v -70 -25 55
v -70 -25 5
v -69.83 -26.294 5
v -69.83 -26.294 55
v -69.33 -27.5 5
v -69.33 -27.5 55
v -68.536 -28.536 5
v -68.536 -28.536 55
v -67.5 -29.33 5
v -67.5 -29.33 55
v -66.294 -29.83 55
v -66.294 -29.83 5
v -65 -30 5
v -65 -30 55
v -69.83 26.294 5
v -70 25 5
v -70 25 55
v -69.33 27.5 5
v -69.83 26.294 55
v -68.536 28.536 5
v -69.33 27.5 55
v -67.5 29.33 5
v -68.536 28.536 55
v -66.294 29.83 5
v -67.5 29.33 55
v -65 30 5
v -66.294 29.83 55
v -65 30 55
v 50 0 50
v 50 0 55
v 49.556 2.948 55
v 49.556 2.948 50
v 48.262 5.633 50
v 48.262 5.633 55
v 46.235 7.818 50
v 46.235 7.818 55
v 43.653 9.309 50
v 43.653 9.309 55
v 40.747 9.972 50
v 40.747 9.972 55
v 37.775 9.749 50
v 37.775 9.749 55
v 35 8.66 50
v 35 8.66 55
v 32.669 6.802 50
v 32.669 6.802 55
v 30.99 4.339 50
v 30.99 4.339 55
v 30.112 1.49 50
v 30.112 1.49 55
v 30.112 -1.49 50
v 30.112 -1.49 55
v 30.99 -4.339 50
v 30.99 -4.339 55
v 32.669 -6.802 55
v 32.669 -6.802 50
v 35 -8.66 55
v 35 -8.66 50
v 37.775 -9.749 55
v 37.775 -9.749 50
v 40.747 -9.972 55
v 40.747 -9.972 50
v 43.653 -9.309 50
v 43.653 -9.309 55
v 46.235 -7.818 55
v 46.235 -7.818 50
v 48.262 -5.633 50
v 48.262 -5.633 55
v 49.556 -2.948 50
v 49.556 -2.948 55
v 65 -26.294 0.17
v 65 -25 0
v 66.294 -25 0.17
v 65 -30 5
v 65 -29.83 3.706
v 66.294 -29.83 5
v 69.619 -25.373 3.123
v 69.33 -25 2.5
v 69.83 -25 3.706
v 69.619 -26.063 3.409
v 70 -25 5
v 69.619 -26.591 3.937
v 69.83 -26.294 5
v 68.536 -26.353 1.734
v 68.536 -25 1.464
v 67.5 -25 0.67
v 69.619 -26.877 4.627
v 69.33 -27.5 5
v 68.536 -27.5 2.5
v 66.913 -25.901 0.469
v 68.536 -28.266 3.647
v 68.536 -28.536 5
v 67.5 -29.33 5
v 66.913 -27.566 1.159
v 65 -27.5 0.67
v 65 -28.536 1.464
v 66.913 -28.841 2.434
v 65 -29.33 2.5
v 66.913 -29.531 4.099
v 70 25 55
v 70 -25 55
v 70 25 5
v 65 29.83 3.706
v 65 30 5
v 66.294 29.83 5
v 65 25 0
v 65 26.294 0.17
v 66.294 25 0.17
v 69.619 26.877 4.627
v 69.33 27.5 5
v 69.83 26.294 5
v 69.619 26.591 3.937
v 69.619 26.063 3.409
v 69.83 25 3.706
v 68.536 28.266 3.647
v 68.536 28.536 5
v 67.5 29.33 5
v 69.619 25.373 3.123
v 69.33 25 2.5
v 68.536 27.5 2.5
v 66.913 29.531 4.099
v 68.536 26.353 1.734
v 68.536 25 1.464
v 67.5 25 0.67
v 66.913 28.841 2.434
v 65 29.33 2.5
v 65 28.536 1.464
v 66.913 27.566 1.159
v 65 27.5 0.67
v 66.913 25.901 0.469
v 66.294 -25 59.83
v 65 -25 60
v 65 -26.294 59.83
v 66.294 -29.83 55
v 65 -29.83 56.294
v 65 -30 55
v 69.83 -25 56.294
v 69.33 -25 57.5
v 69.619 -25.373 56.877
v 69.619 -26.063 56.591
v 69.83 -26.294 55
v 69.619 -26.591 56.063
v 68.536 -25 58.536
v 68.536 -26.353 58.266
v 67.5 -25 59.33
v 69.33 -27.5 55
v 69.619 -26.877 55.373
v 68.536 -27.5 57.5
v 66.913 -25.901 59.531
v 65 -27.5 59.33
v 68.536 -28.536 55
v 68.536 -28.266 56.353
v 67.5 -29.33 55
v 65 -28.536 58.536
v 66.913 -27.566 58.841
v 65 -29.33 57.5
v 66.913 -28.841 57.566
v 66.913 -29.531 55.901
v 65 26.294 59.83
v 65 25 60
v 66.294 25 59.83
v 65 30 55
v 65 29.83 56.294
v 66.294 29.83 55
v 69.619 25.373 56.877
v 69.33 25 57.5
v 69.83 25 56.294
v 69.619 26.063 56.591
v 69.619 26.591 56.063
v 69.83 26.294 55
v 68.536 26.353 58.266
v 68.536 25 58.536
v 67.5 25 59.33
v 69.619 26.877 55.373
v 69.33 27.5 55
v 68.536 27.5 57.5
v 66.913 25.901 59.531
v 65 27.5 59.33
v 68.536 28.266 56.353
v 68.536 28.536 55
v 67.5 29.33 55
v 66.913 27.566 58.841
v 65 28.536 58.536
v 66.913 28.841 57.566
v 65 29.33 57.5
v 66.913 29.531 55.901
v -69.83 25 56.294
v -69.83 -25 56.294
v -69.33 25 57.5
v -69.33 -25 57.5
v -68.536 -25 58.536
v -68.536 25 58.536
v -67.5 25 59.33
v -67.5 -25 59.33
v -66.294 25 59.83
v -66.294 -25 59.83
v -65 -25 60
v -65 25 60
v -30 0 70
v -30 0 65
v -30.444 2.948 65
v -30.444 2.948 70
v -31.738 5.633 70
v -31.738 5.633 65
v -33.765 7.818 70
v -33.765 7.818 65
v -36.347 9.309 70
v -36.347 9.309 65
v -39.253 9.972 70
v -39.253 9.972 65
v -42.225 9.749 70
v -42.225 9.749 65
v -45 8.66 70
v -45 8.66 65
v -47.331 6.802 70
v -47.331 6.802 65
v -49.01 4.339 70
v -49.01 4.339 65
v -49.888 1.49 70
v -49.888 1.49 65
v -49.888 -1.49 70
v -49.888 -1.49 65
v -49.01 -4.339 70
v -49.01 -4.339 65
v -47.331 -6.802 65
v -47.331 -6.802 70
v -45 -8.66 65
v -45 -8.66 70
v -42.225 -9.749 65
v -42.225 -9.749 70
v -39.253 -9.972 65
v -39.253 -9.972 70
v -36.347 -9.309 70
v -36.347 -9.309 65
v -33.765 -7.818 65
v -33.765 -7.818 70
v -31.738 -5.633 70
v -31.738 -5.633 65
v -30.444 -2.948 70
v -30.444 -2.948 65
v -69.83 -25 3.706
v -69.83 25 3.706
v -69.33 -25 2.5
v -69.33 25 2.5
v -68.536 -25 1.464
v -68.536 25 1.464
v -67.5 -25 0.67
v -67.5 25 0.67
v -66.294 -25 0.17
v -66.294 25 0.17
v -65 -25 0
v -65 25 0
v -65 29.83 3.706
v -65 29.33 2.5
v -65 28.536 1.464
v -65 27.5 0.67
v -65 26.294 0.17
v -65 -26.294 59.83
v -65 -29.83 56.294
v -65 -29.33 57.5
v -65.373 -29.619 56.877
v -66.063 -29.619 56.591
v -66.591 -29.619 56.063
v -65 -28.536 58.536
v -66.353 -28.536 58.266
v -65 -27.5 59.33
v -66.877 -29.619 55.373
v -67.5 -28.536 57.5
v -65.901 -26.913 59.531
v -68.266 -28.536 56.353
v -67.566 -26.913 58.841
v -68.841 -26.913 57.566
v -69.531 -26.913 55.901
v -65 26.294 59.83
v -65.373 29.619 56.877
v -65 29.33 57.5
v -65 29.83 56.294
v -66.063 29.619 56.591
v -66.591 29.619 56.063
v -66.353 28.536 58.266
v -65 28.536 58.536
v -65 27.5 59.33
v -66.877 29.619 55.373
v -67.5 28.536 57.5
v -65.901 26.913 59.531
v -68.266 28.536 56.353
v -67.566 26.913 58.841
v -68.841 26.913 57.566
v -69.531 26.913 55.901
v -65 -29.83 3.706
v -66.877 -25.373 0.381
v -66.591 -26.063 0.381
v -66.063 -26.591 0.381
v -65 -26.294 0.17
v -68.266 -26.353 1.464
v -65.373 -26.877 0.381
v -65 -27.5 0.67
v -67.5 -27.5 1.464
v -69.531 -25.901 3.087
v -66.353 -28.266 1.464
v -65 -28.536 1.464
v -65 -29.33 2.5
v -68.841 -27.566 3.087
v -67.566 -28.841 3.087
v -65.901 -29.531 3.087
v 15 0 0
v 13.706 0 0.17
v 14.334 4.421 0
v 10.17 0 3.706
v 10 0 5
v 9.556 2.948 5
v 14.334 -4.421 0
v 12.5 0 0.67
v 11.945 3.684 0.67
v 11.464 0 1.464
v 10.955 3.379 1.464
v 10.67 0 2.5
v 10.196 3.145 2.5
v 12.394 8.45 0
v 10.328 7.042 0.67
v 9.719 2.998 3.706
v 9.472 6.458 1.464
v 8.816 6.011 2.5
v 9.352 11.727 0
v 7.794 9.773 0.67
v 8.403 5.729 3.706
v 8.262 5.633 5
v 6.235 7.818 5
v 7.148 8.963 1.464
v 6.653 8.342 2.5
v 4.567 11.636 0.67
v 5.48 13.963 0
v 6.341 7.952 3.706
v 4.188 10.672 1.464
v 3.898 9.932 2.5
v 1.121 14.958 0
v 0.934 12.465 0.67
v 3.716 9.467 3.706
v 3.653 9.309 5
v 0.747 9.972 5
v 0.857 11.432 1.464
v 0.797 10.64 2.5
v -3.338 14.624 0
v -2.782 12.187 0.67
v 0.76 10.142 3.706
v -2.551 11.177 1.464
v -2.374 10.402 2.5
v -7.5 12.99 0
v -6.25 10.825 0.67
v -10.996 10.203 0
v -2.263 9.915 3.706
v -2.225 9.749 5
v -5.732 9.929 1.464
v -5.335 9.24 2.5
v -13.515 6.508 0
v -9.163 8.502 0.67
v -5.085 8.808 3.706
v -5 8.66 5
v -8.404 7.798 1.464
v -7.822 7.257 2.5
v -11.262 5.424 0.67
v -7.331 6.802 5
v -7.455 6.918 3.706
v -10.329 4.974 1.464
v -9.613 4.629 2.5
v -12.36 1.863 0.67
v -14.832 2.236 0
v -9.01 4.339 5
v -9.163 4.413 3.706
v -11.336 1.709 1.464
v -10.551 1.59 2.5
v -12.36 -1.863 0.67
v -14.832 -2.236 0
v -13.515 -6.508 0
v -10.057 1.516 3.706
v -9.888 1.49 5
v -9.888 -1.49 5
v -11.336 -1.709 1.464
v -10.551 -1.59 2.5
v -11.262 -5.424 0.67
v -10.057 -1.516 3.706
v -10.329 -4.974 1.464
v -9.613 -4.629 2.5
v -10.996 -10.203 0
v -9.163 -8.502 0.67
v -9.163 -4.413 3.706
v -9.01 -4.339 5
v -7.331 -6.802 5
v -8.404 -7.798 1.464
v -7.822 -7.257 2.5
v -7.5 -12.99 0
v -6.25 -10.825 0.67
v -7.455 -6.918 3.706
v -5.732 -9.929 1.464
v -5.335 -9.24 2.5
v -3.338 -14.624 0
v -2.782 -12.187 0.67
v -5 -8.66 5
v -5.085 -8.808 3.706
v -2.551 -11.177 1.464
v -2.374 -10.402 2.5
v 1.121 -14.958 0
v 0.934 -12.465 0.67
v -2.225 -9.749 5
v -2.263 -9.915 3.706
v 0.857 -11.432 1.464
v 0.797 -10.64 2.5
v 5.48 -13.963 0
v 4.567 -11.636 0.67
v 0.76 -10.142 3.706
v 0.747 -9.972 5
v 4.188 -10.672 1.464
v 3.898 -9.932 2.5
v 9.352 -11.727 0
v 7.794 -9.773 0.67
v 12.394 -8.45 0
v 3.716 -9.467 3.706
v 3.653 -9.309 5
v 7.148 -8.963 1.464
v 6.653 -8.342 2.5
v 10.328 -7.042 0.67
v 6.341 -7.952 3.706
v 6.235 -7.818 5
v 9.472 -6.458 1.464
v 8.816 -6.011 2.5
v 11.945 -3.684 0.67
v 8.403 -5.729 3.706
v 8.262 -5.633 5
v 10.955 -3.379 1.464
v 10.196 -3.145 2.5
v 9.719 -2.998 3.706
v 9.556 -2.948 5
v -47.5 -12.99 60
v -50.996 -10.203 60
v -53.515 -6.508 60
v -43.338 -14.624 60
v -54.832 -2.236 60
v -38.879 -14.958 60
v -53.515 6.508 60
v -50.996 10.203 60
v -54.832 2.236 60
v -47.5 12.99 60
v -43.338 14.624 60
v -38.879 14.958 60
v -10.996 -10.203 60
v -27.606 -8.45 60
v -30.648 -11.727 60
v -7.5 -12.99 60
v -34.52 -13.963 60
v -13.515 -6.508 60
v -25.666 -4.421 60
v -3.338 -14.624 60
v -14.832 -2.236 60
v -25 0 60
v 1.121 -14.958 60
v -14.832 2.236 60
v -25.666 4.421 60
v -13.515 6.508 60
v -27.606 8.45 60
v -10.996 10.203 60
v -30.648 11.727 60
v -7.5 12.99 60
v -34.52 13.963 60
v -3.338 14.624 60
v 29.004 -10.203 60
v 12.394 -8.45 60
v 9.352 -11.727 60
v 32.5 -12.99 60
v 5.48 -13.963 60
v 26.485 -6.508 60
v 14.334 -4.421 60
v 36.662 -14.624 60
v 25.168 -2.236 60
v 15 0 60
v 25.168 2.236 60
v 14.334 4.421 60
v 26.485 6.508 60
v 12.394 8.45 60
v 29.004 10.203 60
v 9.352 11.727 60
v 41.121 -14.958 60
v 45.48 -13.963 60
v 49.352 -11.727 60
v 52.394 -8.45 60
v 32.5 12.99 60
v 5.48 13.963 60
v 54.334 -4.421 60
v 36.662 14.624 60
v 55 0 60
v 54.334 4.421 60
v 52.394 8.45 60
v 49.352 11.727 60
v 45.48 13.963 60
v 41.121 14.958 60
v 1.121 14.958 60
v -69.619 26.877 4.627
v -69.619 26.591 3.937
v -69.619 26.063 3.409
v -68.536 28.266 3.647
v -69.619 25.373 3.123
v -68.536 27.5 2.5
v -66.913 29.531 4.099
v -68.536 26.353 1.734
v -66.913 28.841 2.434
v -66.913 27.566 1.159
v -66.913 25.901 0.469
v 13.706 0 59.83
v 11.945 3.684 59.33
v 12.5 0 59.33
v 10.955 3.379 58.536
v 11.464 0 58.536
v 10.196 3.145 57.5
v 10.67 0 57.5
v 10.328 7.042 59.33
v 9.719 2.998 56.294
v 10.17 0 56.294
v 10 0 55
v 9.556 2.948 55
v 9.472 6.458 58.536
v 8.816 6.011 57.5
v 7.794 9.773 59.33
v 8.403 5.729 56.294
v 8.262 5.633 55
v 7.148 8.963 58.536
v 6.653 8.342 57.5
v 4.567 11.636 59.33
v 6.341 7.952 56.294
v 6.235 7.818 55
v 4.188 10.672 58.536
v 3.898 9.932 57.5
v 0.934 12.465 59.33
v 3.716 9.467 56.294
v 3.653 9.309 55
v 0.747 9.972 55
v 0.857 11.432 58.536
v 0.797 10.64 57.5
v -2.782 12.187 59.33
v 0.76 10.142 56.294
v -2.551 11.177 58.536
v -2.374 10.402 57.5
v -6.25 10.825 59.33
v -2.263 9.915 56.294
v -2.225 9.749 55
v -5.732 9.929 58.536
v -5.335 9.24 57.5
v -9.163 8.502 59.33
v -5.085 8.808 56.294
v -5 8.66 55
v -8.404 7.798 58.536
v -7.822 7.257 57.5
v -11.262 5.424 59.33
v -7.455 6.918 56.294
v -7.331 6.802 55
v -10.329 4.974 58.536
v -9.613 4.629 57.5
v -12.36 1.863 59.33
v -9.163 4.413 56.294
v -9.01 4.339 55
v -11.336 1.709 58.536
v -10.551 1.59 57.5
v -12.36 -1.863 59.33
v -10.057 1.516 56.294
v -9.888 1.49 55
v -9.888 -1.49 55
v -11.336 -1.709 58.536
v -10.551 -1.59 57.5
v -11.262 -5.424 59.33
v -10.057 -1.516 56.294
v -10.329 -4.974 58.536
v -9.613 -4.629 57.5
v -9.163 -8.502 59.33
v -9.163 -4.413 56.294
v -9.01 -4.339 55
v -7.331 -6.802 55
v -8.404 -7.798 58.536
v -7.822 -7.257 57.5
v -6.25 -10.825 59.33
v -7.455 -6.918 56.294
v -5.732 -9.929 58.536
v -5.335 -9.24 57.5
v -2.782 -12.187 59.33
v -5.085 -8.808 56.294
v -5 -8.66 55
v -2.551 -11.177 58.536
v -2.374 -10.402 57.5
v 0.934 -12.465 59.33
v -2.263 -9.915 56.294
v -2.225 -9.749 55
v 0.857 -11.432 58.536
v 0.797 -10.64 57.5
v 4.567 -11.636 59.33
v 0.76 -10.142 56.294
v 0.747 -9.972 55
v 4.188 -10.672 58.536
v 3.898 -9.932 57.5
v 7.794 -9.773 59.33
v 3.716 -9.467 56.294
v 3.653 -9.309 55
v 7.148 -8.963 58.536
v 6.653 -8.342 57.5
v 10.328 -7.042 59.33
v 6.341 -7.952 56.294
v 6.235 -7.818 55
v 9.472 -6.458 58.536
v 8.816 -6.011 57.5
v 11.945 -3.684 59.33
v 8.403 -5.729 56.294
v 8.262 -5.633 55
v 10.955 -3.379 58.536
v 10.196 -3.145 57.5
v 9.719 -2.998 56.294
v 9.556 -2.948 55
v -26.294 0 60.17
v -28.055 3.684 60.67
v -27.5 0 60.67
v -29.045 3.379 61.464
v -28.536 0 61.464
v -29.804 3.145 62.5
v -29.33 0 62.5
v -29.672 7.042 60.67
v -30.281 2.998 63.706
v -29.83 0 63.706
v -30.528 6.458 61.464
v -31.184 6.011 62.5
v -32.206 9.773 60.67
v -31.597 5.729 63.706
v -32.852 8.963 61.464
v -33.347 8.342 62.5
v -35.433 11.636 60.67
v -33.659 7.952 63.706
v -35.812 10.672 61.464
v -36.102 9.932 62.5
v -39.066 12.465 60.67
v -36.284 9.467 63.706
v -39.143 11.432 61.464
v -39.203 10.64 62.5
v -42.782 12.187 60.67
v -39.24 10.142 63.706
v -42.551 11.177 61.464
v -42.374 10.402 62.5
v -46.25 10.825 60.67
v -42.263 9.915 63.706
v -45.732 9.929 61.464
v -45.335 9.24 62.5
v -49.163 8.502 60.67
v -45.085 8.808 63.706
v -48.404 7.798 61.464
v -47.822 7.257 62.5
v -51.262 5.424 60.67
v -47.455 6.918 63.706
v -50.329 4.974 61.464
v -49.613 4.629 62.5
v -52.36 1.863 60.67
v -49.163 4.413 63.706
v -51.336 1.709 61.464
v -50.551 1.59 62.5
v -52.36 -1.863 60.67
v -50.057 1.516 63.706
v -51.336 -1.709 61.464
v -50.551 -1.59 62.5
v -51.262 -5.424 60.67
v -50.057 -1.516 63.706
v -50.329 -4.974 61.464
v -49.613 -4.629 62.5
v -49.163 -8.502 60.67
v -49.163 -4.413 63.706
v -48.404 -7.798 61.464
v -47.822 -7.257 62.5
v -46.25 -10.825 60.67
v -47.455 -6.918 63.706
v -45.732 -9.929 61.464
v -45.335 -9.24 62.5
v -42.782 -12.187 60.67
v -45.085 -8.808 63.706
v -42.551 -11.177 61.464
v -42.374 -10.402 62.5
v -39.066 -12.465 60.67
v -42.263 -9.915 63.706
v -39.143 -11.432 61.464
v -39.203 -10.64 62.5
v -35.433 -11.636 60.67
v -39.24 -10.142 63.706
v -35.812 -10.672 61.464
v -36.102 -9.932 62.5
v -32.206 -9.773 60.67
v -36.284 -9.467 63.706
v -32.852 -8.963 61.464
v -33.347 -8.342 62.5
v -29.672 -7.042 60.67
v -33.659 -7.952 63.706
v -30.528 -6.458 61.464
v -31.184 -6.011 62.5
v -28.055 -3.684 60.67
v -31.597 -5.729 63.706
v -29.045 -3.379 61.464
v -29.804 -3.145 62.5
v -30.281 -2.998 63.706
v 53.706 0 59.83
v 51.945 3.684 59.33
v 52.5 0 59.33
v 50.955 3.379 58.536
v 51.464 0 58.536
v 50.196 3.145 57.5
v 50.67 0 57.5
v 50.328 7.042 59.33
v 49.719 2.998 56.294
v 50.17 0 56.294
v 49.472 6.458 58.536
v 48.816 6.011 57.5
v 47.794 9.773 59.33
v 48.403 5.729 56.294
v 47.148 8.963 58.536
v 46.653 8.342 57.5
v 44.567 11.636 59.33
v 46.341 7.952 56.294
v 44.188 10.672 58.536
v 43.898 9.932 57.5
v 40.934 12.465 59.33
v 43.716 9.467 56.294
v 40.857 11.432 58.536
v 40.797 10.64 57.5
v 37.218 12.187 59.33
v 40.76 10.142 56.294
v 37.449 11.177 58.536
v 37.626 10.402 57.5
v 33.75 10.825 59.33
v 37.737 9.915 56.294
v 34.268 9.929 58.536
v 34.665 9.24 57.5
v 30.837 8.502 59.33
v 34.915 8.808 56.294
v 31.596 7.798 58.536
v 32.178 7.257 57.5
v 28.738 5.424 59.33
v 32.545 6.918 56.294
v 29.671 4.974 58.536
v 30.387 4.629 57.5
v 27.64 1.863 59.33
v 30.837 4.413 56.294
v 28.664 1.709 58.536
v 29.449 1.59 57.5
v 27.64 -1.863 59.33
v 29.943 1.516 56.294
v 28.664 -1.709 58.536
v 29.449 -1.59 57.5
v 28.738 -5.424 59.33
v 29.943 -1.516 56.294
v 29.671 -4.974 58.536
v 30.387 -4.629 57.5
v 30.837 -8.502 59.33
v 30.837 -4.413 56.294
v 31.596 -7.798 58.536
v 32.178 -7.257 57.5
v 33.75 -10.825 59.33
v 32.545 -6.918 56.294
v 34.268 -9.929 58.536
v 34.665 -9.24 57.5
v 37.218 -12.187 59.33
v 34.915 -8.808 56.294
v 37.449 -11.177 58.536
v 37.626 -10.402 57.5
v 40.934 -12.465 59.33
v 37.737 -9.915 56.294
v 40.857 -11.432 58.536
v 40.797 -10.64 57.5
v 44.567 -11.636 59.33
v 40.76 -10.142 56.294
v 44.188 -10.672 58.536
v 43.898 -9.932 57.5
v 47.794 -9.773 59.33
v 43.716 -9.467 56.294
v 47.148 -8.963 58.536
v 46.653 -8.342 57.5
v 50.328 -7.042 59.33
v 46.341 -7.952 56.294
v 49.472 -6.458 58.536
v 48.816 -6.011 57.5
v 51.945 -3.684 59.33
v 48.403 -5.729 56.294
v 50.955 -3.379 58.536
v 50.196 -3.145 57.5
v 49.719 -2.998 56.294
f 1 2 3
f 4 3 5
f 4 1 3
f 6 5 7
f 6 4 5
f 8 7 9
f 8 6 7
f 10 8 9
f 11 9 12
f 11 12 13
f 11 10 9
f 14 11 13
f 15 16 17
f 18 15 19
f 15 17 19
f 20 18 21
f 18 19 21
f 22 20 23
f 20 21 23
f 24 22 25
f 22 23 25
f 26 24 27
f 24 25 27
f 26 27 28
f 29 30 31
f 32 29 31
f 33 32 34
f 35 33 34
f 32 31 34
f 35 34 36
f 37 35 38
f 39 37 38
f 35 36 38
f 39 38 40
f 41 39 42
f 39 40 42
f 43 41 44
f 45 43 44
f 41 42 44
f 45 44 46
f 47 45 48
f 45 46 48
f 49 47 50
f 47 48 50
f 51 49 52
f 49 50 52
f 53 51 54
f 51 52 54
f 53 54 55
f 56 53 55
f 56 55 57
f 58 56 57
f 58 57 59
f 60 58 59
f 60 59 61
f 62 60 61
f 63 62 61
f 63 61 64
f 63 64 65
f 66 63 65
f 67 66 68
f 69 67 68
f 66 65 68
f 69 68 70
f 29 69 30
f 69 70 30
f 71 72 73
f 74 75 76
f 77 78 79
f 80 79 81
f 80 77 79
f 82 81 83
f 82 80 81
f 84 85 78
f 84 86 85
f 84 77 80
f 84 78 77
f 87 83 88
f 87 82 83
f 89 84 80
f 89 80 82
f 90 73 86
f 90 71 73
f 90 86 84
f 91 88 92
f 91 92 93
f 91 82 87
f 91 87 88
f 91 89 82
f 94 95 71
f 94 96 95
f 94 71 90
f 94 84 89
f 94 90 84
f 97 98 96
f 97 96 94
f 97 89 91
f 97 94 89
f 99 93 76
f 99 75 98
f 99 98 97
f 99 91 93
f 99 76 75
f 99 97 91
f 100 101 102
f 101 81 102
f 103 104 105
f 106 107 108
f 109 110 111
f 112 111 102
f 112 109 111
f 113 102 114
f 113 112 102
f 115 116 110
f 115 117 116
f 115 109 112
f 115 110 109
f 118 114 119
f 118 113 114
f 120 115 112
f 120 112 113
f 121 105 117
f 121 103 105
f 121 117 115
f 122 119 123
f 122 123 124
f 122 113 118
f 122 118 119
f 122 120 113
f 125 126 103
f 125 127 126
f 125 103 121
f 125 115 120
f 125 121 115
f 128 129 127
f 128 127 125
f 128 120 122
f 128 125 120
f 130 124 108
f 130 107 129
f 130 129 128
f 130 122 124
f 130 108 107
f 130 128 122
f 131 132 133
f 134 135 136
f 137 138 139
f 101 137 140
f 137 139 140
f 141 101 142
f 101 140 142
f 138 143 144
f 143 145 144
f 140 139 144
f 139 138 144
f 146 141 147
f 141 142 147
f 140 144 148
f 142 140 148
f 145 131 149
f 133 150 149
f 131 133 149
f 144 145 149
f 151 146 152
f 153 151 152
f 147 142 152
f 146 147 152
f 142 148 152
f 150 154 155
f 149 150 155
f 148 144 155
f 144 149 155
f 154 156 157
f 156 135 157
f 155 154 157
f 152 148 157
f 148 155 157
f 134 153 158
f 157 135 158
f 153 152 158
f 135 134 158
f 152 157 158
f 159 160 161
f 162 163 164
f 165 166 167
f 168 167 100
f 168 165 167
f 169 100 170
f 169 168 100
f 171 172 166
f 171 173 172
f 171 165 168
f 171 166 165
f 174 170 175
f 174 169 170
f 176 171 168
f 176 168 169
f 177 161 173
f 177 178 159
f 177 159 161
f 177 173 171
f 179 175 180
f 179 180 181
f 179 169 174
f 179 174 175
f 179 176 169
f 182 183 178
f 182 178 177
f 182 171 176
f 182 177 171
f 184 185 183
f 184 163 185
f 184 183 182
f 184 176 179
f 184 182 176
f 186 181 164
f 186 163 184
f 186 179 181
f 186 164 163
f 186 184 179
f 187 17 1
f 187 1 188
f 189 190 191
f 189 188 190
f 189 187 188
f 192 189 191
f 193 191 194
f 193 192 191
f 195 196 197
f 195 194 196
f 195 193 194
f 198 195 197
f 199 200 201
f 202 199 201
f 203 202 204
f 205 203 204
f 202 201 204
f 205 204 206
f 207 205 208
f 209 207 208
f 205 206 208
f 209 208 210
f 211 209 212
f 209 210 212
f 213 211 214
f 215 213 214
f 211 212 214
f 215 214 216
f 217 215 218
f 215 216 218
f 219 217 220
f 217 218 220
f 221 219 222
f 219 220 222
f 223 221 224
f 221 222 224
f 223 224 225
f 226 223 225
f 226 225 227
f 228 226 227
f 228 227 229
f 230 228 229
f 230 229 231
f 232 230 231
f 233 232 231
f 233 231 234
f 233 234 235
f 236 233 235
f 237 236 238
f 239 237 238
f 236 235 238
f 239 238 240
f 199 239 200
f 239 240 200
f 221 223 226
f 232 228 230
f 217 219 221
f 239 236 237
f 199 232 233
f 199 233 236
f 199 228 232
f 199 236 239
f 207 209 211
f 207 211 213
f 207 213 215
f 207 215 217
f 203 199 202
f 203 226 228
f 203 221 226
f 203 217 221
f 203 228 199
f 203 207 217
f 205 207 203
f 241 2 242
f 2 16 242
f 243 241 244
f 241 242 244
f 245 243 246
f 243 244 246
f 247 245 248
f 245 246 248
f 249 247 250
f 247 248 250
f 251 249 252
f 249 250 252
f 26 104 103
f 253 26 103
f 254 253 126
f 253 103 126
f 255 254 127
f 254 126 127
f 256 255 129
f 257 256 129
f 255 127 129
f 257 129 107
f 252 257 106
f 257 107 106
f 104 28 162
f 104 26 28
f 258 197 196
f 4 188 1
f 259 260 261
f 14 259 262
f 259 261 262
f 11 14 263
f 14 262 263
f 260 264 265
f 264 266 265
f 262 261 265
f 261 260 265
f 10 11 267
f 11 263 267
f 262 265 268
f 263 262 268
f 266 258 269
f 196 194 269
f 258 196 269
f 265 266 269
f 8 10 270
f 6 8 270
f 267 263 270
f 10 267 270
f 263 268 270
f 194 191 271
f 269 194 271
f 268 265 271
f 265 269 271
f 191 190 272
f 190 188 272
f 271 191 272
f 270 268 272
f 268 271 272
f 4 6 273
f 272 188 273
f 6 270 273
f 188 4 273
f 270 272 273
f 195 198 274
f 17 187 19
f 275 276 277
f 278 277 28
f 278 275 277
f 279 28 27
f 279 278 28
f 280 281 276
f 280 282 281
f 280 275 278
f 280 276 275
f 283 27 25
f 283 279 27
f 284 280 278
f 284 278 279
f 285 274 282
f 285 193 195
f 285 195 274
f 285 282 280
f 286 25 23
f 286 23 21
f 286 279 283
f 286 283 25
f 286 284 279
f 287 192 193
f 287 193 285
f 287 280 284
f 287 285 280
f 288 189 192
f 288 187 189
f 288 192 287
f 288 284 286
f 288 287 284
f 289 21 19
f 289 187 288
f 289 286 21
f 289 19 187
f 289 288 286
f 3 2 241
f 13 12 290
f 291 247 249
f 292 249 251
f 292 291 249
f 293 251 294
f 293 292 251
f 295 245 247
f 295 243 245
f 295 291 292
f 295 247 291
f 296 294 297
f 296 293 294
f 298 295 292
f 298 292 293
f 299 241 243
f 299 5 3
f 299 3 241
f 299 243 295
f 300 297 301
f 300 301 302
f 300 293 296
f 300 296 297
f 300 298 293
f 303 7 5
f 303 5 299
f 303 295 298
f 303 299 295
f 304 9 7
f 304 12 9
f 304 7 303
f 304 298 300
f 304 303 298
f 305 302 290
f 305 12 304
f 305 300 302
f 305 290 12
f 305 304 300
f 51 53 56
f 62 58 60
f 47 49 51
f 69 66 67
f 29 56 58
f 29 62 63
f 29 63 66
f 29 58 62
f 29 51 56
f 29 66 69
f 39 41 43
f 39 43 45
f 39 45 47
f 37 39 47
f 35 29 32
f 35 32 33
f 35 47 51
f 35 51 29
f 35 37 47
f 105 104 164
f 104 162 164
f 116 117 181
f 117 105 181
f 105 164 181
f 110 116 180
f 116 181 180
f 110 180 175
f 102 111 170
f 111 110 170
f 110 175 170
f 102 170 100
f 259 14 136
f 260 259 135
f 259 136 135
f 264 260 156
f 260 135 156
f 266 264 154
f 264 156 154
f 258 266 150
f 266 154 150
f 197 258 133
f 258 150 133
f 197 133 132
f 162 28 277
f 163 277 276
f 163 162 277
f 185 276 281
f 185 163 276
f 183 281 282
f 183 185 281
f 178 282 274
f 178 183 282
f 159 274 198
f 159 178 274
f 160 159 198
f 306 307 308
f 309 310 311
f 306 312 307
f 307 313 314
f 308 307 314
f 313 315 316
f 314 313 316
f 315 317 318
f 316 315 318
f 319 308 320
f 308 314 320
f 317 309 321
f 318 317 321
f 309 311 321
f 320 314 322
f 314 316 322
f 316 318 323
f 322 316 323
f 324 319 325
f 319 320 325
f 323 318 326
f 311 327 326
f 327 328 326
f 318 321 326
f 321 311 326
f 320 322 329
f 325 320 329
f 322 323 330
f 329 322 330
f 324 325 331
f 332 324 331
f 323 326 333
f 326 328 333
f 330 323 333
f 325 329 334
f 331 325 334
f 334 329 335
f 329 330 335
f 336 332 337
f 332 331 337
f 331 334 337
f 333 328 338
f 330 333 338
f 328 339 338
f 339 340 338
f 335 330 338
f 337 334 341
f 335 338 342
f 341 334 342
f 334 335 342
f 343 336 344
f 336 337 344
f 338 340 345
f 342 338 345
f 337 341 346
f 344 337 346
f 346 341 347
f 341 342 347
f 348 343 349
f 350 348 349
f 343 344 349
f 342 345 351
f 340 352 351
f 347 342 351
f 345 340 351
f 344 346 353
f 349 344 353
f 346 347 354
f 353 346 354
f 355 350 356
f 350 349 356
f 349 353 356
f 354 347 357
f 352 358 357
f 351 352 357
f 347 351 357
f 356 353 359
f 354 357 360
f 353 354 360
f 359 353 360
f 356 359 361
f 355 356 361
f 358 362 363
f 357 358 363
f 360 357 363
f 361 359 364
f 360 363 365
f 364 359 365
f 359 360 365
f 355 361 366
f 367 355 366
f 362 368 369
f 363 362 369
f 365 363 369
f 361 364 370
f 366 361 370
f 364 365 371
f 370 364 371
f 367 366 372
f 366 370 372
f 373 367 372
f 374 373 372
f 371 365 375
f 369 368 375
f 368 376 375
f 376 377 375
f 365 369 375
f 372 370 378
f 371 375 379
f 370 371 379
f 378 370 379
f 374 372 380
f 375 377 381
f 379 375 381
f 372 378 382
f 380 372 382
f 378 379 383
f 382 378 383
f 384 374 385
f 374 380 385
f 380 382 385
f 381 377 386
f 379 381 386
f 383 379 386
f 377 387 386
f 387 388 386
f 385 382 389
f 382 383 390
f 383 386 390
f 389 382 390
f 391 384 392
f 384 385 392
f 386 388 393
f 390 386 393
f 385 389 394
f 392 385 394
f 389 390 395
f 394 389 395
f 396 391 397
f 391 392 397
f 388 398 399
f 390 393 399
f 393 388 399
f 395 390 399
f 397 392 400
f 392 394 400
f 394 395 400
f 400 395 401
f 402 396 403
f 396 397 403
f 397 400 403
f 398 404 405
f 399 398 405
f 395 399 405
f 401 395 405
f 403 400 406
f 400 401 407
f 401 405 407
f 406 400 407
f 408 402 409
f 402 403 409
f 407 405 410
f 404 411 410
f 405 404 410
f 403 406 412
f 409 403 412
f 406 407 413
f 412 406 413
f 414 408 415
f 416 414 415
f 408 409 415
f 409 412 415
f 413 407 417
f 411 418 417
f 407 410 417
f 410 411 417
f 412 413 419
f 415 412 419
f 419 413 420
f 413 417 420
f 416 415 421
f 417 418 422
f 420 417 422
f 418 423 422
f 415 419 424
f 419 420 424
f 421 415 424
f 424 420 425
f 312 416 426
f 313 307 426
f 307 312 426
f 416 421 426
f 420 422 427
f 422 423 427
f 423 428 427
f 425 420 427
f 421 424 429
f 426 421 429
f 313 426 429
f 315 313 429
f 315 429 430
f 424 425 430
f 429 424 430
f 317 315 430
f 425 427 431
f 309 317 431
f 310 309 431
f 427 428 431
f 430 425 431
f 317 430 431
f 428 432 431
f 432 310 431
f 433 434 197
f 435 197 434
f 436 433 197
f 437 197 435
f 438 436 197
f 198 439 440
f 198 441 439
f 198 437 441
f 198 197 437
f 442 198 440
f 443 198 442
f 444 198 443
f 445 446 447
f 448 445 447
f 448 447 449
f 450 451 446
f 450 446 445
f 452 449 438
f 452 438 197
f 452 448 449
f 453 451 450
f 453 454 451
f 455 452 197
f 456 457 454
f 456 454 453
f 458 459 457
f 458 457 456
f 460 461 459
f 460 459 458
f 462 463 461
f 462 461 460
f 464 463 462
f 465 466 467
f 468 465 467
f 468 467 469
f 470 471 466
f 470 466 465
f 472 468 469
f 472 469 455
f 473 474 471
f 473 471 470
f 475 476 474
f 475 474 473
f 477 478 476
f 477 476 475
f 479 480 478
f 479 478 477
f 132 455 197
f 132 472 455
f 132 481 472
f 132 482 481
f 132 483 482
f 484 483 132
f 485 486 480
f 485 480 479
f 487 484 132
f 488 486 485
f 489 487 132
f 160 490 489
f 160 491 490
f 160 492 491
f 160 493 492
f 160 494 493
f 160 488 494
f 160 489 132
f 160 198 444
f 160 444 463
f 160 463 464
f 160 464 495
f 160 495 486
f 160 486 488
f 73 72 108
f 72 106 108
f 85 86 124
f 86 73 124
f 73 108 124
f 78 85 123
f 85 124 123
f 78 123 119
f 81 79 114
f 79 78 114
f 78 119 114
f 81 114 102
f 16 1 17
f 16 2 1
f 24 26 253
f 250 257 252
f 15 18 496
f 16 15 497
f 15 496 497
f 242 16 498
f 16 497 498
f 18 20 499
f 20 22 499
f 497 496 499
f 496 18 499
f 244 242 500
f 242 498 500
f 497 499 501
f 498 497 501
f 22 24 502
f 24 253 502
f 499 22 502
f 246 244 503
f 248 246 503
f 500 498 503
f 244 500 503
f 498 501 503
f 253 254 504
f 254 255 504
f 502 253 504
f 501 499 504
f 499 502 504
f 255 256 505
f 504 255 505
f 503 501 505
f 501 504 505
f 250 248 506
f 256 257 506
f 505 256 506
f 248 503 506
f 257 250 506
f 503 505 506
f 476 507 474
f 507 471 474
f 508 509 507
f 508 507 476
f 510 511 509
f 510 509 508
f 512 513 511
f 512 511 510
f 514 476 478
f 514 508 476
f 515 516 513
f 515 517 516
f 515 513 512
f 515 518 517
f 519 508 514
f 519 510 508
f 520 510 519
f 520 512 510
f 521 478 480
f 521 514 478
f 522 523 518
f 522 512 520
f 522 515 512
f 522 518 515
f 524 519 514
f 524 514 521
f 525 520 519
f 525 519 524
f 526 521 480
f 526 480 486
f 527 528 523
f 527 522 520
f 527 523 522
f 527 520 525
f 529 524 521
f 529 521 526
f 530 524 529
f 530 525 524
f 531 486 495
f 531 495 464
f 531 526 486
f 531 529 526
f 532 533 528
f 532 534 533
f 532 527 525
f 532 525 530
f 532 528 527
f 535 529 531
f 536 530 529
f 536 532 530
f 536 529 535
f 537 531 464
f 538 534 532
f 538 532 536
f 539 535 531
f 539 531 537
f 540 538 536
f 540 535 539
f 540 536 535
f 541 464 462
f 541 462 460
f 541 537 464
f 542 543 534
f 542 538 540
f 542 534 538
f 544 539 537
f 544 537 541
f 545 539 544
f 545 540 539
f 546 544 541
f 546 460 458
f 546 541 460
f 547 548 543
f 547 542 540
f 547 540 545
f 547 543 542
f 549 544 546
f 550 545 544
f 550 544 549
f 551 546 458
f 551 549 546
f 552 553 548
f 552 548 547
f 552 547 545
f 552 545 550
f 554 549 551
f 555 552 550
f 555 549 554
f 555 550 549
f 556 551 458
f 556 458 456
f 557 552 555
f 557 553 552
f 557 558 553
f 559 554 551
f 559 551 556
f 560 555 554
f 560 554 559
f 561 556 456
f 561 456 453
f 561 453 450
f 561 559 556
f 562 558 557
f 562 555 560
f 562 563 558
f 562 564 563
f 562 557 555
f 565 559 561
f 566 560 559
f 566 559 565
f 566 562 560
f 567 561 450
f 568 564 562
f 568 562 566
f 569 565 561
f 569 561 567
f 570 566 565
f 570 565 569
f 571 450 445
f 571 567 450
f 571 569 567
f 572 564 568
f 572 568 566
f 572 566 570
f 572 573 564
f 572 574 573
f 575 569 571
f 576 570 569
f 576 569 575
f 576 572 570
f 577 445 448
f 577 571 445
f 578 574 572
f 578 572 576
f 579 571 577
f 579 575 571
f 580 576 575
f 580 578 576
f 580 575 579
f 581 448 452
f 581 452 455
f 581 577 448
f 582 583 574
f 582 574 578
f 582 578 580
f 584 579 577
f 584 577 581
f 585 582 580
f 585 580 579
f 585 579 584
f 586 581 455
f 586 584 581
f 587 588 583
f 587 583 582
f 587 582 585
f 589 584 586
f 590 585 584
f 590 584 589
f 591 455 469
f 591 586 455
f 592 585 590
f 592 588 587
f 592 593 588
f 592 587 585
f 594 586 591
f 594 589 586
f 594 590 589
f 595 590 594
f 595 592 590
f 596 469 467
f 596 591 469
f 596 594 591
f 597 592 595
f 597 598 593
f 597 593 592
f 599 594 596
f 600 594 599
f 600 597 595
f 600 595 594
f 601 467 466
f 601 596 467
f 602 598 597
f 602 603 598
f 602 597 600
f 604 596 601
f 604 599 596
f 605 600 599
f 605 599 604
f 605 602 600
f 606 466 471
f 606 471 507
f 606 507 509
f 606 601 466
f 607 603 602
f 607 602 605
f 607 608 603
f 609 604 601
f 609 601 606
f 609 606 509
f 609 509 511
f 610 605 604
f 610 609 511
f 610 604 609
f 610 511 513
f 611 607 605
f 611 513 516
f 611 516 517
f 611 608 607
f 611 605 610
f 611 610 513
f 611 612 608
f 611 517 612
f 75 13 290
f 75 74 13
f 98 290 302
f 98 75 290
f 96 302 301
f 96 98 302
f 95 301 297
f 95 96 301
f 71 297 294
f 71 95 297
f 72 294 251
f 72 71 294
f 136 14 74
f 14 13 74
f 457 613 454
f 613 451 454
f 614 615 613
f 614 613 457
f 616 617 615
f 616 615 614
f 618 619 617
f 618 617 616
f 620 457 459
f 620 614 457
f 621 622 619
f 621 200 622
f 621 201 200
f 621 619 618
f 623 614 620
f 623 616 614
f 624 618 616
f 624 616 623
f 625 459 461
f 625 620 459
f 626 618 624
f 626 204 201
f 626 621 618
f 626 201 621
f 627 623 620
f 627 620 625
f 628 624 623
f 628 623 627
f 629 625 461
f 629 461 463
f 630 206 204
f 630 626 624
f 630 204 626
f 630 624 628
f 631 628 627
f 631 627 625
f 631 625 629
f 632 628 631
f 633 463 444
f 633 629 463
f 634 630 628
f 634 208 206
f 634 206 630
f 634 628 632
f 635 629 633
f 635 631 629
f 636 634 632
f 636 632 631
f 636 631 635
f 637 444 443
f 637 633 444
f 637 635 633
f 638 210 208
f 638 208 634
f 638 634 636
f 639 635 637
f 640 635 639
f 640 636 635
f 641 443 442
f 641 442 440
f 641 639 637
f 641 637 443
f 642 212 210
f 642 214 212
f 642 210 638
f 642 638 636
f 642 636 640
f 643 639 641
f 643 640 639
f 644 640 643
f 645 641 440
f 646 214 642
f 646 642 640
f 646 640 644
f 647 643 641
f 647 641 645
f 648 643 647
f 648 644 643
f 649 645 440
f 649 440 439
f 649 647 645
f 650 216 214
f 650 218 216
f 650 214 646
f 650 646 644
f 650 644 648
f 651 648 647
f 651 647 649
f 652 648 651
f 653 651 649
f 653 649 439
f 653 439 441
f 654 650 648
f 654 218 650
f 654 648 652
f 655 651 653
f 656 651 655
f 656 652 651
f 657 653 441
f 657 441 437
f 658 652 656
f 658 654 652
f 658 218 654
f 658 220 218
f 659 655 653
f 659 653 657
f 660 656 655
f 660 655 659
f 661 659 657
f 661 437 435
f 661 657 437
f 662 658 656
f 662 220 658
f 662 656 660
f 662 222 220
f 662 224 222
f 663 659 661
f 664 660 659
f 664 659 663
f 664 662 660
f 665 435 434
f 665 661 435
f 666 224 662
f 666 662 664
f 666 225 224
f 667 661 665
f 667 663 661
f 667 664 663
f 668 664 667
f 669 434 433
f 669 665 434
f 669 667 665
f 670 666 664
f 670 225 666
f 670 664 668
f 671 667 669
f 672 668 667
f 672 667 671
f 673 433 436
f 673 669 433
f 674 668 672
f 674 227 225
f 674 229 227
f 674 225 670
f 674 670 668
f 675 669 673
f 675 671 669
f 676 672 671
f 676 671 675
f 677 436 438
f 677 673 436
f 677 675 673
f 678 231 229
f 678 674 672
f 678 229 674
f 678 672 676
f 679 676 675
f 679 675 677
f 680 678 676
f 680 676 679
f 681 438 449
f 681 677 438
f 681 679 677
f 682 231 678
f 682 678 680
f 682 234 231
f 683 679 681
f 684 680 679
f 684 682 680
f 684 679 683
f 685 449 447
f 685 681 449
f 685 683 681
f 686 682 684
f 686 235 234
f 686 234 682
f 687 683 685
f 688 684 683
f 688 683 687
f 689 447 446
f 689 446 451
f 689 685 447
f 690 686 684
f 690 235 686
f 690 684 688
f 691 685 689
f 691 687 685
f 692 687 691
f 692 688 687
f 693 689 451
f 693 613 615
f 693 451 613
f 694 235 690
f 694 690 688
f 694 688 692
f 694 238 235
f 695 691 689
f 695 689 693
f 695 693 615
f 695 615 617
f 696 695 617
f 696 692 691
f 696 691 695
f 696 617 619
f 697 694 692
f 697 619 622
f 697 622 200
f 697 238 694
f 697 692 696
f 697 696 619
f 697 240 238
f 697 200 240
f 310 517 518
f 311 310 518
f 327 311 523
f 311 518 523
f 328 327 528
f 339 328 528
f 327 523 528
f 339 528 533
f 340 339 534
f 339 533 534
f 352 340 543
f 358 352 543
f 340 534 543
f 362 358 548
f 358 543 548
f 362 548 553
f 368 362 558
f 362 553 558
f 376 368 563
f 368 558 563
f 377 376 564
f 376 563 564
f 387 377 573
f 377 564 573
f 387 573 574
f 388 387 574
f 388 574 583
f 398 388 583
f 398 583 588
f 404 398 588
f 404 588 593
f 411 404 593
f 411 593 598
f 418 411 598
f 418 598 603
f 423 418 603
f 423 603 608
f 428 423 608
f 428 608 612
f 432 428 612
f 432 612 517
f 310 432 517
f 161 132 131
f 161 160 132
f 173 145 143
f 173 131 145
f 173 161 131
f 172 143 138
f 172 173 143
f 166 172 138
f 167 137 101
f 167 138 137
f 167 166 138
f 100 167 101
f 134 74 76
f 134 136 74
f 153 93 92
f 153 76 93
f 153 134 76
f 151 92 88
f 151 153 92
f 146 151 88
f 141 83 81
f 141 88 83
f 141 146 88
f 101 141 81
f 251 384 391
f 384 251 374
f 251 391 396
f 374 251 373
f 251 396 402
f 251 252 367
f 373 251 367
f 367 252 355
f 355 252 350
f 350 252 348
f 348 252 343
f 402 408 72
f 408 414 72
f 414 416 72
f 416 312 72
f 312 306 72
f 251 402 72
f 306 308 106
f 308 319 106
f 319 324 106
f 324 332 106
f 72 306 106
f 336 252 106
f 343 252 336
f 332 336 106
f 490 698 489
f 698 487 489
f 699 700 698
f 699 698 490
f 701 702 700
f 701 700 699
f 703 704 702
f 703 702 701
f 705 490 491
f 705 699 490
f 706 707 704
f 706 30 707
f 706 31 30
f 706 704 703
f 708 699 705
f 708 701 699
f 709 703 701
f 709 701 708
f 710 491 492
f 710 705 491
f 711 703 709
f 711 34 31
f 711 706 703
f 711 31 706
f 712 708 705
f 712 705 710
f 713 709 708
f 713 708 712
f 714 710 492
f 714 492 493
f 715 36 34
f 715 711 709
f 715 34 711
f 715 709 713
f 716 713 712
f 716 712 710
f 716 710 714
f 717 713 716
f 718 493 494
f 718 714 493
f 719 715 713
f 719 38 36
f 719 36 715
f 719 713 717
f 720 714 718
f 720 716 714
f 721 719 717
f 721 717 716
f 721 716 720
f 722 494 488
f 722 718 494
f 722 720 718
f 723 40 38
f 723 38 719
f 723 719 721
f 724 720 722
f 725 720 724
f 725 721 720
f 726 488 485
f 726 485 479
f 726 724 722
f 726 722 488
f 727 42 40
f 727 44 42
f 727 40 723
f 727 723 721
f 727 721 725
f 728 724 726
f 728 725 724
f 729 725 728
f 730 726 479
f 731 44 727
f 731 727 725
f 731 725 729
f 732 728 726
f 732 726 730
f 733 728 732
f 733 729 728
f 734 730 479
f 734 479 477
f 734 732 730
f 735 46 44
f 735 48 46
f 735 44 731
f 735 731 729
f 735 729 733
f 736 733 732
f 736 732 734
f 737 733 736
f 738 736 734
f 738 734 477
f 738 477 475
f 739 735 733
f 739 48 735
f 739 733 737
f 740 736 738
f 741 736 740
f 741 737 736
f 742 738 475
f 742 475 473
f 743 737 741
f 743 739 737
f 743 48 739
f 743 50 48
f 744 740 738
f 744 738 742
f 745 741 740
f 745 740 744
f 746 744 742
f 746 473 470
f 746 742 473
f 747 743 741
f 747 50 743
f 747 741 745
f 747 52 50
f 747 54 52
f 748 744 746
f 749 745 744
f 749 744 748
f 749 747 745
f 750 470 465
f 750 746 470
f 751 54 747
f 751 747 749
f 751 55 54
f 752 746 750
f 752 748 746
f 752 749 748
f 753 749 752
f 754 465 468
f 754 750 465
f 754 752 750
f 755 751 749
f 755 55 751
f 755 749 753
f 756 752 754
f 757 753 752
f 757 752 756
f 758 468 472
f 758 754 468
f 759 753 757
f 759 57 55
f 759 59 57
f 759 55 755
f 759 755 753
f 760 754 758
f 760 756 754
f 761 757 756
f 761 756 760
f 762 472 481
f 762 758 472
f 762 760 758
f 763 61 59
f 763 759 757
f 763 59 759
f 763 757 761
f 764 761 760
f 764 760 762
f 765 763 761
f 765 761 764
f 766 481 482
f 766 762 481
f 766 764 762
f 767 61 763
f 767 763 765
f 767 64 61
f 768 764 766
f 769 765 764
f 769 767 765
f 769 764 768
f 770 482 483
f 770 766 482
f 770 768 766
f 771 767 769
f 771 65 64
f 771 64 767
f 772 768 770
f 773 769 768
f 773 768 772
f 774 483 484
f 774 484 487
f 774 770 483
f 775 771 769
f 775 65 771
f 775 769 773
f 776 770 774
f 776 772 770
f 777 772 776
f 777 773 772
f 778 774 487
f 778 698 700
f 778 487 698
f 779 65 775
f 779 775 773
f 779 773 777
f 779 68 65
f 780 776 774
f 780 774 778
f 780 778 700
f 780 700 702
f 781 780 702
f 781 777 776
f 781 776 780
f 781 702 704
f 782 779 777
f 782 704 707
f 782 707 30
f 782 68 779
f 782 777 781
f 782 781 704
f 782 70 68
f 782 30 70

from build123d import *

# Parameters (mm, degrees)
F0_W     = 140
F0_H     = 60
F1_DEPTH = 60
F2_R     = 10
F5_DEPTH = 10
F3_R     = 10
F6_DEPTH = 10
F4_R     = 10
F7_DEPTH = 132.8
F8_R     = 5


with BuildPart() as f1:
    # F0 (on Top) → F1 (new body)
    with BuildSketch(Plane.XY):
        Rectangle(F0_W, F0_H)
    extrude(amount=F1_DEPTH)

    # F2 (on face) → F5 (join)
    with BuildSketch(Plane.XY.offset(60)):
        with Locations((-40, 0)):
            Circle(F2_R)
    extrude(amount=F5_DEPTH)

    # F3 (on face) → F6 (cut)
    with BuildSketch(Plane.XY.offset(60)):
        with Locations((40, 0)):
            Circle(F3_R)
    extrude(amount=-F6_DEPTH, mode=Mode.SUBTRACT)

    # F4 (on face) → F7 (cut)
    with BuildSketch(Plane.XY.offset(60)):
        Circle(F4_R)
    extrude(amount=-F7_DEPTH, mode=Mode.SUBTRACT)

    # F8
    f8_edges = [f1.edges().sort_by_distance(p)[0] for p in [
        (-70, 0, 60),
        (0, 30, 60),
        (0, -30, 60),
        (70, 0, 60),
        (-50, 0, 60),
        (-10, 0, 60),
        (30, 0, 60),
        (0, 30, 0),
        (-70, 30, 30),
        (70, 30, 30),
        (-70, -30, 30),
        (-70, 0, 0),
        (0, -30, 0),
        (-10, 0, 0),
        (70, 0, 0),
        (70, -30, 30),
    ]]
    fillet(f8_edges, radius=F8_R)


solid = f1.part
